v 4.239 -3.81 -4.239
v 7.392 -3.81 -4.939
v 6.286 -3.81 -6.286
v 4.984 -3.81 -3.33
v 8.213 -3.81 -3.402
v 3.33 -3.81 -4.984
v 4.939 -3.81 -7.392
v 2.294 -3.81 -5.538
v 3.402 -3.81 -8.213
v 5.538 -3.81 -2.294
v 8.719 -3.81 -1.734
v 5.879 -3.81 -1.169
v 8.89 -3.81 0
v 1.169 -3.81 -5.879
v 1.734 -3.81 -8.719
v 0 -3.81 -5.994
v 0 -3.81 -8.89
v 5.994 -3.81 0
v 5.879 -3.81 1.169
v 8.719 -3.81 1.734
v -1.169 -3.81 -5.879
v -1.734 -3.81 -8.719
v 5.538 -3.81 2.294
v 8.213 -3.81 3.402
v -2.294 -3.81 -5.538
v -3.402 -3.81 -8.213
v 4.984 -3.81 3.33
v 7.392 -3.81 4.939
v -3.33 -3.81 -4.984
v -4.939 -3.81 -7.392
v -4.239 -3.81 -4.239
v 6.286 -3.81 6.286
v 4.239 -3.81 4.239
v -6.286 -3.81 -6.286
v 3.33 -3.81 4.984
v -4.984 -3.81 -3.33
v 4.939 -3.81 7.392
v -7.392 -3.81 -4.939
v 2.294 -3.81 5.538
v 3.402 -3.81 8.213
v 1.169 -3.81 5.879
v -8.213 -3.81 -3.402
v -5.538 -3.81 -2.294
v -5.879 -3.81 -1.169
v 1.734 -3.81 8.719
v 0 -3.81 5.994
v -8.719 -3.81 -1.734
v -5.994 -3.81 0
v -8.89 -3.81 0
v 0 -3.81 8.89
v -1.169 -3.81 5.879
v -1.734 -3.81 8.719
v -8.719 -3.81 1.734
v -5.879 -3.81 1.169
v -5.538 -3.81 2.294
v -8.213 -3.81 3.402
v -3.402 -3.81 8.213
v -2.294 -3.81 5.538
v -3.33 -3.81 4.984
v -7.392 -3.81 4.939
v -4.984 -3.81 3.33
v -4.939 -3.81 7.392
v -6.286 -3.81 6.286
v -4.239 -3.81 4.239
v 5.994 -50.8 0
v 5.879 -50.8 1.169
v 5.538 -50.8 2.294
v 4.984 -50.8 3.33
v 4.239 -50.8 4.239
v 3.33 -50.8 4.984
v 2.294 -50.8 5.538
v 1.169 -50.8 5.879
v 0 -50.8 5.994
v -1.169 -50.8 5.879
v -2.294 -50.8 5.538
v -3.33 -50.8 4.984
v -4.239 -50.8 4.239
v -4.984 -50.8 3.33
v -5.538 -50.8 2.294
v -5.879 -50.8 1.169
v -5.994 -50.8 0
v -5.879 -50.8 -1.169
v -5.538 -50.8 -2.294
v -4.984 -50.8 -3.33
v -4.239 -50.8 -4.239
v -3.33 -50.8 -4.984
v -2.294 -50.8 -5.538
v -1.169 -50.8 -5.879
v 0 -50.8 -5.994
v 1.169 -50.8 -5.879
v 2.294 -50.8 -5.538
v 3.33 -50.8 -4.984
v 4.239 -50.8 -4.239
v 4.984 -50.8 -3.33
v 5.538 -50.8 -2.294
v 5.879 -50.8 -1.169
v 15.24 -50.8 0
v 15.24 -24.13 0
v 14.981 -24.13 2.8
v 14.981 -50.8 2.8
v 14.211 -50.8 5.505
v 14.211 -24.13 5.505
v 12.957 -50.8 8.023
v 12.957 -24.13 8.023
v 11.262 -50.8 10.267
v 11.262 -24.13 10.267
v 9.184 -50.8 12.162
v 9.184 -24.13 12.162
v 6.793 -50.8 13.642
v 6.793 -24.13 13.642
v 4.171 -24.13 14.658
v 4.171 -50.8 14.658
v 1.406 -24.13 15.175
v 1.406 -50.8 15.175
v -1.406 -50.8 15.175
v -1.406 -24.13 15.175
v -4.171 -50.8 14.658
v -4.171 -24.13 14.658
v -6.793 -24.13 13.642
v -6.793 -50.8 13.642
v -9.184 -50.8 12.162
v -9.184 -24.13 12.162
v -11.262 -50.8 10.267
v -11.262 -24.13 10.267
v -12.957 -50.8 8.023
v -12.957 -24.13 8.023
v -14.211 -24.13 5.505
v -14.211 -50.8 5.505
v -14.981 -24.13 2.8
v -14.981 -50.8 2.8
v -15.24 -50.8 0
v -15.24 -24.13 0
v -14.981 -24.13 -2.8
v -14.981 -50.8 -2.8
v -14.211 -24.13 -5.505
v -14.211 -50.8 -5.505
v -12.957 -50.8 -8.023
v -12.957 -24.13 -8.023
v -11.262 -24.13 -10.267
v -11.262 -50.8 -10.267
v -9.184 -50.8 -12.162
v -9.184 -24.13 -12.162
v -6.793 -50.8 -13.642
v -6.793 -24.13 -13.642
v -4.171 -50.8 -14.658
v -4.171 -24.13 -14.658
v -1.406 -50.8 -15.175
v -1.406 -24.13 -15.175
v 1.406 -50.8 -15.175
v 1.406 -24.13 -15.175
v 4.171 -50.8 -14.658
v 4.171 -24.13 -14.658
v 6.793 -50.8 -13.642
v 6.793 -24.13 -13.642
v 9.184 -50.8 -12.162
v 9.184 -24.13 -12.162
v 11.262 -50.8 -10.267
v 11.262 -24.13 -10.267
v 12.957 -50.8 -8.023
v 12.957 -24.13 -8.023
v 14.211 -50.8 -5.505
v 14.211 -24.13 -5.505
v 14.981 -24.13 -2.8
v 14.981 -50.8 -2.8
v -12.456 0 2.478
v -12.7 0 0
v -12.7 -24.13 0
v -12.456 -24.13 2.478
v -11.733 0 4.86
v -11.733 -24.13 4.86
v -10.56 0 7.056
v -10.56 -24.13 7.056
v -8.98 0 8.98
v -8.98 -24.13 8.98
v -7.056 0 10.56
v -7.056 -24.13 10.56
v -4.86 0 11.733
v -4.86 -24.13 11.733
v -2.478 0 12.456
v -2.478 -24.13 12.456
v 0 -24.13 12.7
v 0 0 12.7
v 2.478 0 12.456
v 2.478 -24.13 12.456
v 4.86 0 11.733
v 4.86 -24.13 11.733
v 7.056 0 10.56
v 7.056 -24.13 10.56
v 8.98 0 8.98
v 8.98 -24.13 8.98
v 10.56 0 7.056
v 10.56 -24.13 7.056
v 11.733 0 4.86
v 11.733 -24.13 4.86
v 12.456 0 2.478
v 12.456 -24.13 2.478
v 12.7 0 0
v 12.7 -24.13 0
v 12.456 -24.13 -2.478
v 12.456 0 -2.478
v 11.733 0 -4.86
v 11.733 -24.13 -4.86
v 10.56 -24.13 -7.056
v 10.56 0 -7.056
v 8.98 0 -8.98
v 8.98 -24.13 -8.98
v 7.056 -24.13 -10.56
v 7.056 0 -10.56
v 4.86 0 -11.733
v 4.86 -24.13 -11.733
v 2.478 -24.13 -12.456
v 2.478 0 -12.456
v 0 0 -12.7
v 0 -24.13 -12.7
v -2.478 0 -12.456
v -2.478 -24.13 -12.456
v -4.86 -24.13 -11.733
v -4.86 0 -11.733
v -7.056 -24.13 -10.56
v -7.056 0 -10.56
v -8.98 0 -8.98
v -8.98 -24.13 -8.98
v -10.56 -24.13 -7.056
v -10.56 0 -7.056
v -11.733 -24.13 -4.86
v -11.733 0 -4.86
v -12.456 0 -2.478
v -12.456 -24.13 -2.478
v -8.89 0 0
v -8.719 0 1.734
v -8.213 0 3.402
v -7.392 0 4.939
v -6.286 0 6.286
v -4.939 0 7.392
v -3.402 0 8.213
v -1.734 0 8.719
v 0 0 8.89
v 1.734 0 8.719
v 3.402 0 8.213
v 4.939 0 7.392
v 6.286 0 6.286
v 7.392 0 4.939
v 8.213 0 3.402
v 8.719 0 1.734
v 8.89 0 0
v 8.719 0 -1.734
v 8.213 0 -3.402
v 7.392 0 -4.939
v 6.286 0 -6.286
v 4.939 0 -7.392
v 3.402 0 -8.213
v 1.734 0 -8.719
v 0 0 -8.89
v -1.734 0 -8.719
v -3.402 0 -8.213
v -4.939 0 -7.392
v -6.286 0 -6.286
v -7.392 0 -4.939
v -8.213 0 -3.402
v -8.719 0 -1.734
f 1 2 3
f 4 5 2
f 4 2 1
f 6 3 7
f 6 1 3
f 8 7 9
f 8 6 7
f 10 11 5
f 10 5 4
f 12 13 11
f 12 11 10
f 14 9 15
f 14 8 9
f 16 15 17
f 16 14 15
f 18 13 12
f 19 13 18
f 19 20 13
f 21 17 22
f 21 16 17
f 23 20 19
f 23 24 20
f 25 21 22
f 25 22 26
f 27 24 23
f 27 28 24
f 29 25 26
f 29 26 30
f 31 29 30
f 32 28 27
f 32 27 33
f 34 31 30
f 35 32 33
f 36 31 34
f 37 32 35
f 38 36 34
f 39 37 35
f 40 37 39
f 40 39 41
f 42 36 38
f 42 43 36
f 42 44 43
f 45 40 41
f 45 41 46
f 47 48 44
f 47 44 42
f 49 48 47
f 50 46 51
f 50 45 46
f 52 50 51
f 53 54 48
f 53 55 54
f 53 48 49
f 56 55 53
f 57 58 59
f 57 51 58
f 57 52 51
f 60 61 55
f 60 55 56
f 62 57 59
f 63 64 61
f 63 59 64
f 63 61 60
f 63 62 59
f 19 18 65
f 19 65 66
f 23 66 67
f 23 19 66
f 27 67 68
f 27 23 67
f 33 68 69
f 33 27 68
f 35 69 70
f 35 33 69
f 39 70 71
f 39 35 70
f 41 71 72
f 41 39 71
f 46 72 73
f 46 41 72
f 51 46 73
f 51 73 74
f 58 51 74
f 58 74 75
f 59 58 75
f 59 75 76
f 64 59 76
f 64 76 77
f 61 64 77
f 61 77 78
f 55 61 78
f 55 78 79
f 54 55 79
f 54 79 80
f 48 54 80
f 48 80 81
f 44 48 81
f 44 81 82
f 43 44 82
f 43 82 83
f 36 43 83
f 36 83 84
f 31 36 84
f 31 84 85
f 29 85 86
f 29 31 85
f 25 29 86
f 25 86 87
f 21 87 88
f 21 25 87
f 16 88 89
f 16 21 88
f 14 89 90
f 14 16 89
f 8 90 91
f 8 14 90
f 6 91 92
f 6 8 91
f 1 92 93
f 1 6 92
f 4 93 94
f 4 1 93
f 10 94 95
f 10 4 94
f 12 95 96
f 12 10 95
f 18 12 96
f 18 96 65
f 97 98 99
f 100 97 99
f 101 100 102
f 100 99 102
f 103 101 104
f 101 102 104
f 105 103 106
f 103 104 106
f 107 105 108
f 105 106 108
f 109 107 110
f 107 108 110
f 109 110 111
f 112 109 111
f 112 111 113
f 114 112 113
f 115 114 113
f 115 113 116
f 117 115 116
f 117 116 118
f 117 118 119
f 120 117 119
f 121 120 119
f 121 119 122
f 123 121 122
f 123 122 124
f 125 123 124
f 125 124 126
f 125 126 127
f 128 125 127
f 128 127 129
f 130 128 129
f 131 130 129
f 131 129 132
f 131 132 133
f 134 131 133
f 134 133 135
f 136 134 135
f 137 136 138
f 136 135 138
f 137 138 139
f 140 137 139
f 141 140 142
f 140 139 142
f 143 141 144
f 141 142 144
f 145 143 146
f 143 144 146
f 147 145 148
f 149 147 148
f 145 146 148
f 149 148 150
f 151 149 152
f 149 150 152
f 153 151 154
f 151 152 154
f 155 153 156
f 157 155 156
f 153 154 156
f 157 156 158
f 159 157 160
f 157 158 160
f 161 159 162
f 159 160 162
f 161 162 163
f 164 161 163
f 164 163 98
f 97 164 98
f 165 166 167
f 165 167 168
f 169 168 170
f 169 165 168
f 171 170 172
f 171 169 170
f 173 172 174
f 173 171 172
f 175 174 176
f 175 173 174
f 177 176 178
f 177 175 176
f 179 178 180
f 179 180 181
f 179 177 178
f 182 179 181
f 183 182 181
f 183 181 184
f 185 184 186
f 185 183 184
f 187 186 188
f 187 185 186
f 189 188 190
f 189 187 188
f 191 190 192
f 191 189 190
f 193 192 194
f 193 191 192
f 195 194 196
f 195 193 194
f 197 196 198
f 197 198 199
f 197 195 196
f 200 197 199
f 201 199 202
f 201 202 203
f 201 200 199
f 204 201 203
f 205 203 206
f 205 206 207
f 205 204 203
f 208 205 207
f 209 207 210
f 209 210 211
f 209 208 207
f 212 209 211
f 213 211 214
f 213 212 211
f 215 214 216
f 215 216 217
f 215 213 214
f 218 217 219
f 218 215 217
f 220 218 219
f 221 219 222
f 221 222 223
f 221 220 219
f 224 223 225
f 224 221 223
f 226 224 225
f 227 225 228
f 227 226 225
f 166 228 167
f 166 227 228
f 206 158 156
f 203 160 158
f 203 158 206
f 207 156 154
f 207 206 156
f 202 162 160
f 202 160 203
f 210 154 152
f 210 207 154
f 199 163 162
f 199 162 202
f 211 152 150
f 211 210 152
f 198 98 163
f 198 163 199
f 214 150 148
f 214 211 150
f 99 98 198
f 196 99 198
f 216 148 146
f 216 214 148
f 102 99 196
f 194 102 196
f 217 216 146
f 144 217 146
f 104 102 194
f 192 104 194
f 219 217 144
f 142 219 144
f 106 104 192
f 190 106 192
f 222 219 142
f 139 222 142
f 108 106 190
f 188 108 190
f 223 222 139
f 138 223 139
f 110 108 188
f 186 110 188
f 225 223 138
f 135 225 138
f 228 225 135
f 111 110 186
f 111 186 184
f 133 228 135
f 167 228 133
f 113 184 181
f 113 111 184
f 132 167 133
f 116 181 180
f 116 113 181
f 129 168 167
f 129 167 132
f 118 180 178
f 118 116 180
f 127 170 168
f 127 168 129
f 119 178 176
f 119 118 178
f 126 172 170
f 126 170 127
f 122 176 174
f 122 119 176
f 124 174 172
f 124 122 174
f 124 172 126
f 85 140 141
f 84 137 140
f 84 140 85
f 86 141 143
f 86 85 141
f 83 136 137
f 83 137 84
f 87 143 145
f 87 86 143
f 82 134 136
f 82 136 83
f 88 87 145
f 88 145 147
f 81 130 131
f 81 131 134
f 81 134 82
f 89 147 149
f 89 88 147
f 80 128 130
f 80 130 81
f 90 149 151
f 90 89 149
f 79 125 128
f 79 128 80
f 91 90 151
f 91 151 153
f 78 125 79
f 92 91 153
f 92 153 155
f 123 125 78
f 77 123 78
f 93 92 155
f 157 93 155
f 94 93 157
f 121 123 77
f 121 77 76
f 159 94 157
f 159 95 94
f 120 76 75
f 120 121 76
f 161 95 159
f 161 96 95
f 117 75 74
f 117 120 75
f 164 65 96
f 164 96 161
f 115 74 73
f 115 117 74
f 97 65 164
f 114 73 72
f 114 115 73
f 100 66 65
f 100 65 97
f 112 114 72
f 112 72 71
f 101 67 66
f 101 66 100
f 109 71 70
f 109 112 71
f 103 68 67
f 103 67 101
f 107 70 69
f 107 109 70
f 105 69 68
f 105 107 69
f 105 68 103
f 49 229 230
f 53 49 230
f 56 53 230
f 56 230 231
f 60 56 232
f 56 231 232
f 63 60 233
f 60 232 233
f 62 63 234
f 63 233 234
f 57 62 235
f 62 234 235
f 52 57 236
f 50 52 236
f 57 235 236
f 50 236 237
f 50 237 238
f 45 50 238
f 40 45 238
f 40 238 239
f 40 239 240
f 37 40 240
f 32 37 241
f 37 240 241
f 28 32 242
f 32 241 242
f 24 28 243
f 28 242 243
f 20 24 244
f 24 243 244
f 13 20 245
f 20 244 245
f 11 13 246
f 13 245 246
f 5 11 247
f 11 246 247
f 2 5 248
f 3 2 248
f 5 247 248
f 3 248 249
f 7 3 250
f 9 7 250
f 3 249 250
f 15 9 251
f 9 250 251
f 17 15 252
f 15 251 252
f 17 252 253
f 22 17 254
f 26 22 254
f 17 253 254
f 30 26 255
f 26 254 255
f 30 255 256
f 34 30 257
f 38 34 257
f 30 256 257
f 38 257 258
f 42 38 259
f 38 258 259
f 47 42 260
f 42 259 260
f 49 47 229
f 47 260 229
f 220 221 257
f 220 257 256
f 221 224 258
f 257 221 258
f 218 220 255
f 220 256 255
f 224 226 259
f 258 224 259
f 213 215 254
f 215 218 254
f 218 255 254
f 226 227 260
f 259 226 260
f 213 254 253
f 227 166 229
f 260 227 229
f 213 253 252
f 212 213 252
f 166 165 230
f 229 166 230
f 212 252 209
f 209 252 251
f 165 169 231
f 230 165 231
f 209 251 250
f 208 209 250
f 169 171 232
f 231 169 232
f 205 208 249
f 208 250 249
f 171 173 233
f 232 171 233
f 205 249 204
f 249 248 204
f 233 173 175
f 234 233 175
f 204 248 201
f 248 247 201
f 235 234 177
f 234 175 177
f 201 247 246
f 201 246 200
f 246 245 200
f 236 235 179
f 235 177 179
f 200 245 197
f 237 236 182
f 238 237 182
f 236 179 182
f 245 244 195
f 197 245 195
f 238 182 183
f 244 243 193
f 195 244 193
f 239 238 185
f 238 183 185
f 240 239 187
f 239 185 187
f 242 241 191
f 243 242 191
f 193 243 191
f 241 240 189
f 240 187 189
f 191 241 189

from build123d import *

# Parameters (mm, degrees)
F0_R     = 15.24
F0_R_2   = 5.9944
F1_DEPTH = 50.8
F2_R     = 18.435252
F2_R_2   = 12.7
F3_DEPTH = 24.13
F4_R     = 8.89
F5_DEPTH = 3.81


with BuildPart() as f1:
    # F0 (on Front) → F1 (new body)
    with BuildSketch(Plane.XZ):
        Circle(F0_R)
        Circle(F0_R_2, mode=Mode.SUBTRACT)
    extrude(amount=F1_DEPTH)

    # F2 (on face) → F3 (cut)
    with BuildSketch(Plane(origin=(0, 0, 0), x_dir=(-1, 0, 0), z_dir=(0, 1, 0))):
        Circle(F2_R)
        Circle(F2_R_2, mode=Mode.SUBTRACT)
    extrude(amount=-F3_DEPTH, mode=Mode.SUBTRACT)

    # F4 (on face) → F5 (cut)
    with BuildSketch(Plane(origin=(0, 0, 0), x_dir=(-1, 0, 0), z_dir=(0, 1, 0))):
        Circle(F4_R)
    extrude(amount=-F5_DEPTH, mode=Mode.SUBTRACT)


solid = f1.part
